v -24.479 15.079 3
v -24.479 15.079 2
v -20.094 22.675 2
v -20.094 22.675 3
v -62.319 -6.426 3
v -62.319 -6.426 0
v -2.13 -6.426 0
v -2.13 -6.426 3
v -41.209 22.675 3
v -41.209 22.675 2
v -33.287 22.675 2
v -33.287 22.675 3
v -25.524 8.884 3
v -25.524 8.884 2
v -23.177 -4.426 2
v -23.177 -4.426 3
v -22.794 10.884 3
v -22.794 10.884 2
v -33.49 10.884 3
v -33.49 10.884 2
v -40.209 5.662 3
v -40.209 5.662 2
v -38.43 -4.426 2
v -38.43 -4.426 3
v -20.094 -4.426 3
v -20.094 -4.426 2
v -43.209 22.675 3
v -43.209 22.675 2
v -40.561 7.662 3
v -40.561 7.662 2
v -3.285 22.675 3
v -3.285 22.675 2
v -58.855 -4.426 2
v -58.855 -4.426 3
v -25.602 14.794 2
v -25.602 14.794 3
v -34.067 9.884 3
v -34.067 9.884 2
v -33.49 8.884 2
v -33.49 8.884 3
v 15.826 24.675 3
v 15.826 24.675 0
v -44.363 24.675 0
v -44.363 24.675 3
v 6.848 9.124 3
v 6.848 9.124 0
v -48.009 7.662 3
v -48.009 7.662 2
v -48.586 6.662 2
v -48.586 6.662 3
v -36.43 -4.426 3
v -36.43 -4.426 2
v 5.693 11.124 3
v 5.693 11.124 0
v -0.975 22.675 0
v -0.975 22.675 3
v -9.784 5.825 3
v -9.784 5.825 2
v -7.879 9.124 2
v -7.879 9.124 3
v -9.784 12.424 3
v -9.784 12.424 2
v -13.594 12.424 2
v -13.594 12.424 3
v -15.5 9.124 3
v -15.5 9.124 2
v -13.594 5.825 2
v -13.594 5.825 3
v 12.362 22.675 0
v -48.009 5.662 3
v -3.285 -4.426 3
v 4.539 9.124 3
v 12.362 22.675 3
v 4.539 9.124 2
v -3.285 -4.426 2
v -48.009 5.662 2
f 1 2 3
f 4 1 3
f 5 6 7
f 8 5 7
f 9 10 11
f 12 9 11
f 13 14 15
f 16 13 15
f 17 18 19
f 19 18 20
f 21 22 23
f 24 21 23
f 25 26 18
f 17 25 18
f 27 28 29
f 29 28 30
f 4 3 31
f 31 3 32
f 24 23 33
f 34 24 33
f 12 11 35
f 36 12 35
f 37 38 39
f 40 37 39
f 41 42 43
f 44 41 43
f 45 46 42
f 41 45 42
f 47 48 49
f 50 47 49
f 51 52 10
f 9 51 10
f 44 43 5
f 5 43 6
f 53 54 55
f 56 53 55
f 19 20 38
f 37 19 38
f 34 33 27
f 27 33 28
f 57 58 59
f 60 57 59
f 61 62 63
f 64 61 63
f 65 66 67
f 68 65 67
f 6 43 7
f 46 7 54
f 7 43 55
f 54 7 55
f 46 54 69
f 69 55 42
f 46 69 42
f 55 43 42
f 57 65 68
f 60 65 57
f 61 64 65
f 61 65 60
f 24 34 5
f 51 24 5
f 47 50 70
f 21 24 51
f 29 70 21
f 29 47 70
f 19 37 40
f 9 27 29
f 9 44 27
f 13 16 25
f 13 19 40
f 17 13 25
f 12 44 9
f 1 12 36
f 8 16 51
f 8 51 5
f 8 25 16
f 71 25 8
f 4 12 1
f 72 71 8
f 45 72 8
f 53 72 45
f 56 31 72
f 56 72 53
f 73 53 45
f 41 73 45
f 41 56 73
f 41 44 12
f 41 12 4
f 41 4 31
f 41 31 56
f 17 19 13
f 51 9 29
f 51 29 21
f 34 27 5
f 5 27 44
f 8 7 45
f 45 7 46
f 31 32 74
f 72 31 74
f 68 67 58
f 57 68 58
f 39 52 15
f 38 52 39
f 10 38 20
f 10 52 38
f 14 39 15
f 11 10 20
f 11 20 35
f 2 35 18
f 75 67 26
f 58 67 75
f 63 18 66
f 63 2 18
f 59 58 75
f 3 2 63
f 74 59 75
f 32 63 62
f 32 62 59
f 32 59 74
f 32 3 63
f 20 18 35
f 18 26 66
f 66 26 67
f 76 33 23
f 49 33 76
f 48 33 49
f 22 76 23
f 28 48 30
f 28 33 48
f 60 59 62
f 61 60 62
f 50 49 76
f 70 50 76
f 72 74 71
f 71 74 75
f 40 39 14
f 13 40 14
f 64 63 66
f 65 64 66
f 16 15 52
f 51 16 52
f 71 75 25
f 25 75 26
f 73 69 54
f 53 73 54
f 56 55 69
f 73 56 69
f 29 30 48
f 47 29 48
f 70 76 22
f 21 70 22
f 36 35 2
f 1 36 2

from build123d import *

# Parameters (mm, degrees)
F1_DEPTH = 2
F2_DEPTH = 3
F3_DEPTH = 3


# Not quite as in the source:
# - a feature names something its author has since deleted; it is built from what else it names


with BuildPart() as f1:
    # F0 (on Top) → F1 (new body)
    with BuildSketch(Plane.XY):
        Polygon((-43.2085677565, 22.6745967576), (-58.8549531333, -4.4257376699), (-38.4300476107, -4.4257376699), (-40.2088151152, 5.6621541398), (-48.0090622621, 5.6621541398), (-48.5864125313, 6.6621541398), (-48.0090622621, 7.6621541398), (-40.5614690766, 7.6621541398), align=None)
    extrude(amount=F1_DEPTH)



with BuildPart() as f1b:
    # F0 (on Top) → F1, piece 2 (new body)
    with BuildSketch(Plane.XY):
        Polygon((-41.2085677565, 22.6745967576), (-36.4300476107, -4.4257376699), (-25.5239465254, -4.4257376699), (-23.5239465254, -4.4257376699), (-23.1770010553, -4.4257376699), (-25.5239465254, 8.8844515061), (-33.4898163741, 8.8844515061), (-34.0671666433, 9.8844515061), (-33.4898163741, 10.8844515061), (-22.7936475677, 10.8844515061), (-20.0940481363, -4.4257376699), (-3.2846095154, -4.4257376699), (4.538583173, 9.1244295439), (-3.2846095154, 22.6745967576), (-20.0940481363, 22.6745967576), (-24.4790815038, 15.0794961721), (-25.6024042349, 14.7936511306), (-33.2868439501, 22.6745967576), align=None)
        Polygon((-15.4996355878, 9.1244295439), (-13.5944822068, 12.424251996), (-9.7841754448, 12.424251996), (-7.8790220638, 9.1244295439), (-9.7841754448, 5.8246070917), (-13.5944822068, 5.8246070917), align=None, mode=Mode.SUBTRACT)
    extrude(amount=F1_DEPTH)


with BuildPart() as f1_1:
    add(f1.part)

    add(f1b.part)  # F2 merges F1b
    # F0 (on Top) → F2 (join)
    with BuildSketch(Plane.XY):
        Polygon((-2.8602079346, 24.6745967576), (-44.3632682949, 24.6745967576), (-62.3190547484, -6.4257376699), (-38.9180315569, -6.4257376699), (-2.129908977, -6.4257376699), (6.8479842498, 9.1244295439), (15.8258774766, 24.6745967576), align=None)
        Polygon((-38.4300476107, -4.4257376699), (-58.8549531333, -4.4257376699), (-43.2085677565, 22.6745967576), (-41.2085677565, 22.6745967576), (-33.2868439501, 22.6745967576), (-30.5356123181, 22.6745967576), (-20.0940481363, 22.6745967576), (-3.2846095154, 22.6745967576), (4.538583173, 9.1244295439), (-3.2846095154, -4.4257376699), (-20.0940481363, -4.4257376699), (-23.1770010553, -4.4257376699), (-23.5239465254, -4.4257376699), (-25.5239465254, -4.4257376699), (-36.4300476107, -4.4257376699), align=None, mode=Mode.SUBTRACT)
        Polygon((12.3617758614, 22.6745967576), (5.6932837114, 11.1244295439), (-0.9752084386, 22.6745967576), align=None, mode=Mode.SUBTRACT)
        Polygon((-25.5239465254, 8.8844515061), (-23.1770010553, -4.4257376699), (-20.0940481363, -4.4257376699), (-22.7936475677, 10.8844515061), (-33.4898163741, 10.8844515061), (-34.0671666433, 9.8844515061), (-33.4898163741, 8.8844515061), align=None)
        Polygon((-40.2088151152, 5.6621541398), (-38.4300476107, -4.4257376699), (-36.4300476107, -4.4257376699), (-41.2085677565, 22.6745967576), (-43.2085677565, 22.6745967576), (-40.5614690766, 7.6621541398), align=None)
        Polygon((-20.0940481363, 22.6745967576), (-30.5356123181, 22.6745967576), (-24.1704509766, 16.1898996279), (-24.4790815038, 15.0794961721), align=None)
        Polygon((-30.5356123181, 22.6745967576), (-33.2868439501, 22.6745967576), (-25.6024042349, 14.7936511306), (-24.4790815038, 15.0794961721), (-24.1704509766, 16.1898996279), align=None)
        Polygon((-48.0090622621, 5.6621541398), (-40.2088151152, 5.6621541398), (-40.5614690766, 7.6621541398), (-48.0090622621, 7.6621541398), (-48.5864125313, 6.6621541398), align=None)
    extrude(amount=F2_DEPTH)

    # F0 (on Top) → F3 (join)
    with BuildSketch(Plane.XY):
        Polygon((-9.7841754448, 12.424251996), (-13.5944822068, 12.424251996), (-15.4996355878, 9.1244295439), (-13.5944822068, 5.8246070917), (-9.7841754448, 5.8246070917), (-7.8790220638, 9.1244295439), align=None)
    extrude(amount=F3_DEPTH)


solid = f1_1.part
